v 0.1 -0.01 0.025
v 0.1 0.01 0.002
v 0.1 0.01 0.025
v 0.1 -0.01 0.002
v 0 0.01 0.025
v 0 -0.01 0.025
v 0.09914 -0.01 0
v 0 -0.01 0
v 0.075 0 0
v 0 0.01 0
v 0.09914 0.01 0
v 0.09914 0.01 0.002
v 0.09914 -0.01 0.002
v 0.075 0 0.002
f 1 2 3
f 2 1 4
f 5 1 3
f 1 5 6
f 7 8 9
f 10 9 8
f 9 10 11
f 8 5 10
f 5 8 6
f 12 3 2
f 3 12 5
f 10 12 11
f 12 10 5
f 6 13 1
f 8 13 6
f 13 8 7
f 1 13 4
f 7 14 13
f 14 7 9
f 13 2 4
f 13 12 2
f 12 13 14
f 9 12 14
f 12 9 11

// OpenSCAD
s = 1;

length = 0.1;
width = 0.025;
depth = 0.020;
chfdepth = 0;
chfangle = 45;
tcpoffset = 0.075;
cutpos = 0.0;
cutdepth = 0.002;
cutangle = 45;
cuttilt = 0;

/* Produces basic box finger */
module basicShape(length, width, depth)
{
	translate([0, -depth/2, 0]) cube([length, depth, width]);
}

/* Produces the chamfering geometry.
 * length -- length of the finger
 * start_depth -- distance from the finger plane at which the chamfer starts
 * angle --- chamfering angle
 */
module chamfering(length, start_depth, angle) {
	size = 1000;

	translate([length, 0, start_depth])
		rotate([0, 90-angle, 0])
			translate([0, 0, size/2])
				cube(size, center = true);
}

/* Produces the geometry for the cutout.
 * cutpos -- position of the cutout
 * cutdepth -- depth of the cutout
 * cutangle -- the angle of the cutout
 * cuttilt -- the tilt of the cutout
 */
module cutout(cutpos, cutdepth, cutangle, cuttilt) {
	size = 10;

	s_x = tan(cutangle /2);
    echo (s_x);

	translate([cutpos, 0, cutdepth])
		rotate([0, 0, cuttilt])
            scale([1, s_x, 1])
                rotate([180, 0, 45])
                    translate([0, 0, 0])
						cube(size);
}

/* Produces the finger geometry.
 * Parameters...
 */
module finger(length, width, depth, chfdepth, chfangle, cutpos, cutdepth, cutangle, cuttilt) {
	difference() {
		difference() {
			basicShape(length, width, depth);
			chamfering(length, width - width * chfdepth, chfangle);
		}
		cutout(cutpos, cutdepth, cutangle, cuttilt);
	}
}

scale(s)
	finger(length, width, depth, chfdepth, chfangle, tcpoffset+cutpos, cutdepth, cutangle, cuttilt);
